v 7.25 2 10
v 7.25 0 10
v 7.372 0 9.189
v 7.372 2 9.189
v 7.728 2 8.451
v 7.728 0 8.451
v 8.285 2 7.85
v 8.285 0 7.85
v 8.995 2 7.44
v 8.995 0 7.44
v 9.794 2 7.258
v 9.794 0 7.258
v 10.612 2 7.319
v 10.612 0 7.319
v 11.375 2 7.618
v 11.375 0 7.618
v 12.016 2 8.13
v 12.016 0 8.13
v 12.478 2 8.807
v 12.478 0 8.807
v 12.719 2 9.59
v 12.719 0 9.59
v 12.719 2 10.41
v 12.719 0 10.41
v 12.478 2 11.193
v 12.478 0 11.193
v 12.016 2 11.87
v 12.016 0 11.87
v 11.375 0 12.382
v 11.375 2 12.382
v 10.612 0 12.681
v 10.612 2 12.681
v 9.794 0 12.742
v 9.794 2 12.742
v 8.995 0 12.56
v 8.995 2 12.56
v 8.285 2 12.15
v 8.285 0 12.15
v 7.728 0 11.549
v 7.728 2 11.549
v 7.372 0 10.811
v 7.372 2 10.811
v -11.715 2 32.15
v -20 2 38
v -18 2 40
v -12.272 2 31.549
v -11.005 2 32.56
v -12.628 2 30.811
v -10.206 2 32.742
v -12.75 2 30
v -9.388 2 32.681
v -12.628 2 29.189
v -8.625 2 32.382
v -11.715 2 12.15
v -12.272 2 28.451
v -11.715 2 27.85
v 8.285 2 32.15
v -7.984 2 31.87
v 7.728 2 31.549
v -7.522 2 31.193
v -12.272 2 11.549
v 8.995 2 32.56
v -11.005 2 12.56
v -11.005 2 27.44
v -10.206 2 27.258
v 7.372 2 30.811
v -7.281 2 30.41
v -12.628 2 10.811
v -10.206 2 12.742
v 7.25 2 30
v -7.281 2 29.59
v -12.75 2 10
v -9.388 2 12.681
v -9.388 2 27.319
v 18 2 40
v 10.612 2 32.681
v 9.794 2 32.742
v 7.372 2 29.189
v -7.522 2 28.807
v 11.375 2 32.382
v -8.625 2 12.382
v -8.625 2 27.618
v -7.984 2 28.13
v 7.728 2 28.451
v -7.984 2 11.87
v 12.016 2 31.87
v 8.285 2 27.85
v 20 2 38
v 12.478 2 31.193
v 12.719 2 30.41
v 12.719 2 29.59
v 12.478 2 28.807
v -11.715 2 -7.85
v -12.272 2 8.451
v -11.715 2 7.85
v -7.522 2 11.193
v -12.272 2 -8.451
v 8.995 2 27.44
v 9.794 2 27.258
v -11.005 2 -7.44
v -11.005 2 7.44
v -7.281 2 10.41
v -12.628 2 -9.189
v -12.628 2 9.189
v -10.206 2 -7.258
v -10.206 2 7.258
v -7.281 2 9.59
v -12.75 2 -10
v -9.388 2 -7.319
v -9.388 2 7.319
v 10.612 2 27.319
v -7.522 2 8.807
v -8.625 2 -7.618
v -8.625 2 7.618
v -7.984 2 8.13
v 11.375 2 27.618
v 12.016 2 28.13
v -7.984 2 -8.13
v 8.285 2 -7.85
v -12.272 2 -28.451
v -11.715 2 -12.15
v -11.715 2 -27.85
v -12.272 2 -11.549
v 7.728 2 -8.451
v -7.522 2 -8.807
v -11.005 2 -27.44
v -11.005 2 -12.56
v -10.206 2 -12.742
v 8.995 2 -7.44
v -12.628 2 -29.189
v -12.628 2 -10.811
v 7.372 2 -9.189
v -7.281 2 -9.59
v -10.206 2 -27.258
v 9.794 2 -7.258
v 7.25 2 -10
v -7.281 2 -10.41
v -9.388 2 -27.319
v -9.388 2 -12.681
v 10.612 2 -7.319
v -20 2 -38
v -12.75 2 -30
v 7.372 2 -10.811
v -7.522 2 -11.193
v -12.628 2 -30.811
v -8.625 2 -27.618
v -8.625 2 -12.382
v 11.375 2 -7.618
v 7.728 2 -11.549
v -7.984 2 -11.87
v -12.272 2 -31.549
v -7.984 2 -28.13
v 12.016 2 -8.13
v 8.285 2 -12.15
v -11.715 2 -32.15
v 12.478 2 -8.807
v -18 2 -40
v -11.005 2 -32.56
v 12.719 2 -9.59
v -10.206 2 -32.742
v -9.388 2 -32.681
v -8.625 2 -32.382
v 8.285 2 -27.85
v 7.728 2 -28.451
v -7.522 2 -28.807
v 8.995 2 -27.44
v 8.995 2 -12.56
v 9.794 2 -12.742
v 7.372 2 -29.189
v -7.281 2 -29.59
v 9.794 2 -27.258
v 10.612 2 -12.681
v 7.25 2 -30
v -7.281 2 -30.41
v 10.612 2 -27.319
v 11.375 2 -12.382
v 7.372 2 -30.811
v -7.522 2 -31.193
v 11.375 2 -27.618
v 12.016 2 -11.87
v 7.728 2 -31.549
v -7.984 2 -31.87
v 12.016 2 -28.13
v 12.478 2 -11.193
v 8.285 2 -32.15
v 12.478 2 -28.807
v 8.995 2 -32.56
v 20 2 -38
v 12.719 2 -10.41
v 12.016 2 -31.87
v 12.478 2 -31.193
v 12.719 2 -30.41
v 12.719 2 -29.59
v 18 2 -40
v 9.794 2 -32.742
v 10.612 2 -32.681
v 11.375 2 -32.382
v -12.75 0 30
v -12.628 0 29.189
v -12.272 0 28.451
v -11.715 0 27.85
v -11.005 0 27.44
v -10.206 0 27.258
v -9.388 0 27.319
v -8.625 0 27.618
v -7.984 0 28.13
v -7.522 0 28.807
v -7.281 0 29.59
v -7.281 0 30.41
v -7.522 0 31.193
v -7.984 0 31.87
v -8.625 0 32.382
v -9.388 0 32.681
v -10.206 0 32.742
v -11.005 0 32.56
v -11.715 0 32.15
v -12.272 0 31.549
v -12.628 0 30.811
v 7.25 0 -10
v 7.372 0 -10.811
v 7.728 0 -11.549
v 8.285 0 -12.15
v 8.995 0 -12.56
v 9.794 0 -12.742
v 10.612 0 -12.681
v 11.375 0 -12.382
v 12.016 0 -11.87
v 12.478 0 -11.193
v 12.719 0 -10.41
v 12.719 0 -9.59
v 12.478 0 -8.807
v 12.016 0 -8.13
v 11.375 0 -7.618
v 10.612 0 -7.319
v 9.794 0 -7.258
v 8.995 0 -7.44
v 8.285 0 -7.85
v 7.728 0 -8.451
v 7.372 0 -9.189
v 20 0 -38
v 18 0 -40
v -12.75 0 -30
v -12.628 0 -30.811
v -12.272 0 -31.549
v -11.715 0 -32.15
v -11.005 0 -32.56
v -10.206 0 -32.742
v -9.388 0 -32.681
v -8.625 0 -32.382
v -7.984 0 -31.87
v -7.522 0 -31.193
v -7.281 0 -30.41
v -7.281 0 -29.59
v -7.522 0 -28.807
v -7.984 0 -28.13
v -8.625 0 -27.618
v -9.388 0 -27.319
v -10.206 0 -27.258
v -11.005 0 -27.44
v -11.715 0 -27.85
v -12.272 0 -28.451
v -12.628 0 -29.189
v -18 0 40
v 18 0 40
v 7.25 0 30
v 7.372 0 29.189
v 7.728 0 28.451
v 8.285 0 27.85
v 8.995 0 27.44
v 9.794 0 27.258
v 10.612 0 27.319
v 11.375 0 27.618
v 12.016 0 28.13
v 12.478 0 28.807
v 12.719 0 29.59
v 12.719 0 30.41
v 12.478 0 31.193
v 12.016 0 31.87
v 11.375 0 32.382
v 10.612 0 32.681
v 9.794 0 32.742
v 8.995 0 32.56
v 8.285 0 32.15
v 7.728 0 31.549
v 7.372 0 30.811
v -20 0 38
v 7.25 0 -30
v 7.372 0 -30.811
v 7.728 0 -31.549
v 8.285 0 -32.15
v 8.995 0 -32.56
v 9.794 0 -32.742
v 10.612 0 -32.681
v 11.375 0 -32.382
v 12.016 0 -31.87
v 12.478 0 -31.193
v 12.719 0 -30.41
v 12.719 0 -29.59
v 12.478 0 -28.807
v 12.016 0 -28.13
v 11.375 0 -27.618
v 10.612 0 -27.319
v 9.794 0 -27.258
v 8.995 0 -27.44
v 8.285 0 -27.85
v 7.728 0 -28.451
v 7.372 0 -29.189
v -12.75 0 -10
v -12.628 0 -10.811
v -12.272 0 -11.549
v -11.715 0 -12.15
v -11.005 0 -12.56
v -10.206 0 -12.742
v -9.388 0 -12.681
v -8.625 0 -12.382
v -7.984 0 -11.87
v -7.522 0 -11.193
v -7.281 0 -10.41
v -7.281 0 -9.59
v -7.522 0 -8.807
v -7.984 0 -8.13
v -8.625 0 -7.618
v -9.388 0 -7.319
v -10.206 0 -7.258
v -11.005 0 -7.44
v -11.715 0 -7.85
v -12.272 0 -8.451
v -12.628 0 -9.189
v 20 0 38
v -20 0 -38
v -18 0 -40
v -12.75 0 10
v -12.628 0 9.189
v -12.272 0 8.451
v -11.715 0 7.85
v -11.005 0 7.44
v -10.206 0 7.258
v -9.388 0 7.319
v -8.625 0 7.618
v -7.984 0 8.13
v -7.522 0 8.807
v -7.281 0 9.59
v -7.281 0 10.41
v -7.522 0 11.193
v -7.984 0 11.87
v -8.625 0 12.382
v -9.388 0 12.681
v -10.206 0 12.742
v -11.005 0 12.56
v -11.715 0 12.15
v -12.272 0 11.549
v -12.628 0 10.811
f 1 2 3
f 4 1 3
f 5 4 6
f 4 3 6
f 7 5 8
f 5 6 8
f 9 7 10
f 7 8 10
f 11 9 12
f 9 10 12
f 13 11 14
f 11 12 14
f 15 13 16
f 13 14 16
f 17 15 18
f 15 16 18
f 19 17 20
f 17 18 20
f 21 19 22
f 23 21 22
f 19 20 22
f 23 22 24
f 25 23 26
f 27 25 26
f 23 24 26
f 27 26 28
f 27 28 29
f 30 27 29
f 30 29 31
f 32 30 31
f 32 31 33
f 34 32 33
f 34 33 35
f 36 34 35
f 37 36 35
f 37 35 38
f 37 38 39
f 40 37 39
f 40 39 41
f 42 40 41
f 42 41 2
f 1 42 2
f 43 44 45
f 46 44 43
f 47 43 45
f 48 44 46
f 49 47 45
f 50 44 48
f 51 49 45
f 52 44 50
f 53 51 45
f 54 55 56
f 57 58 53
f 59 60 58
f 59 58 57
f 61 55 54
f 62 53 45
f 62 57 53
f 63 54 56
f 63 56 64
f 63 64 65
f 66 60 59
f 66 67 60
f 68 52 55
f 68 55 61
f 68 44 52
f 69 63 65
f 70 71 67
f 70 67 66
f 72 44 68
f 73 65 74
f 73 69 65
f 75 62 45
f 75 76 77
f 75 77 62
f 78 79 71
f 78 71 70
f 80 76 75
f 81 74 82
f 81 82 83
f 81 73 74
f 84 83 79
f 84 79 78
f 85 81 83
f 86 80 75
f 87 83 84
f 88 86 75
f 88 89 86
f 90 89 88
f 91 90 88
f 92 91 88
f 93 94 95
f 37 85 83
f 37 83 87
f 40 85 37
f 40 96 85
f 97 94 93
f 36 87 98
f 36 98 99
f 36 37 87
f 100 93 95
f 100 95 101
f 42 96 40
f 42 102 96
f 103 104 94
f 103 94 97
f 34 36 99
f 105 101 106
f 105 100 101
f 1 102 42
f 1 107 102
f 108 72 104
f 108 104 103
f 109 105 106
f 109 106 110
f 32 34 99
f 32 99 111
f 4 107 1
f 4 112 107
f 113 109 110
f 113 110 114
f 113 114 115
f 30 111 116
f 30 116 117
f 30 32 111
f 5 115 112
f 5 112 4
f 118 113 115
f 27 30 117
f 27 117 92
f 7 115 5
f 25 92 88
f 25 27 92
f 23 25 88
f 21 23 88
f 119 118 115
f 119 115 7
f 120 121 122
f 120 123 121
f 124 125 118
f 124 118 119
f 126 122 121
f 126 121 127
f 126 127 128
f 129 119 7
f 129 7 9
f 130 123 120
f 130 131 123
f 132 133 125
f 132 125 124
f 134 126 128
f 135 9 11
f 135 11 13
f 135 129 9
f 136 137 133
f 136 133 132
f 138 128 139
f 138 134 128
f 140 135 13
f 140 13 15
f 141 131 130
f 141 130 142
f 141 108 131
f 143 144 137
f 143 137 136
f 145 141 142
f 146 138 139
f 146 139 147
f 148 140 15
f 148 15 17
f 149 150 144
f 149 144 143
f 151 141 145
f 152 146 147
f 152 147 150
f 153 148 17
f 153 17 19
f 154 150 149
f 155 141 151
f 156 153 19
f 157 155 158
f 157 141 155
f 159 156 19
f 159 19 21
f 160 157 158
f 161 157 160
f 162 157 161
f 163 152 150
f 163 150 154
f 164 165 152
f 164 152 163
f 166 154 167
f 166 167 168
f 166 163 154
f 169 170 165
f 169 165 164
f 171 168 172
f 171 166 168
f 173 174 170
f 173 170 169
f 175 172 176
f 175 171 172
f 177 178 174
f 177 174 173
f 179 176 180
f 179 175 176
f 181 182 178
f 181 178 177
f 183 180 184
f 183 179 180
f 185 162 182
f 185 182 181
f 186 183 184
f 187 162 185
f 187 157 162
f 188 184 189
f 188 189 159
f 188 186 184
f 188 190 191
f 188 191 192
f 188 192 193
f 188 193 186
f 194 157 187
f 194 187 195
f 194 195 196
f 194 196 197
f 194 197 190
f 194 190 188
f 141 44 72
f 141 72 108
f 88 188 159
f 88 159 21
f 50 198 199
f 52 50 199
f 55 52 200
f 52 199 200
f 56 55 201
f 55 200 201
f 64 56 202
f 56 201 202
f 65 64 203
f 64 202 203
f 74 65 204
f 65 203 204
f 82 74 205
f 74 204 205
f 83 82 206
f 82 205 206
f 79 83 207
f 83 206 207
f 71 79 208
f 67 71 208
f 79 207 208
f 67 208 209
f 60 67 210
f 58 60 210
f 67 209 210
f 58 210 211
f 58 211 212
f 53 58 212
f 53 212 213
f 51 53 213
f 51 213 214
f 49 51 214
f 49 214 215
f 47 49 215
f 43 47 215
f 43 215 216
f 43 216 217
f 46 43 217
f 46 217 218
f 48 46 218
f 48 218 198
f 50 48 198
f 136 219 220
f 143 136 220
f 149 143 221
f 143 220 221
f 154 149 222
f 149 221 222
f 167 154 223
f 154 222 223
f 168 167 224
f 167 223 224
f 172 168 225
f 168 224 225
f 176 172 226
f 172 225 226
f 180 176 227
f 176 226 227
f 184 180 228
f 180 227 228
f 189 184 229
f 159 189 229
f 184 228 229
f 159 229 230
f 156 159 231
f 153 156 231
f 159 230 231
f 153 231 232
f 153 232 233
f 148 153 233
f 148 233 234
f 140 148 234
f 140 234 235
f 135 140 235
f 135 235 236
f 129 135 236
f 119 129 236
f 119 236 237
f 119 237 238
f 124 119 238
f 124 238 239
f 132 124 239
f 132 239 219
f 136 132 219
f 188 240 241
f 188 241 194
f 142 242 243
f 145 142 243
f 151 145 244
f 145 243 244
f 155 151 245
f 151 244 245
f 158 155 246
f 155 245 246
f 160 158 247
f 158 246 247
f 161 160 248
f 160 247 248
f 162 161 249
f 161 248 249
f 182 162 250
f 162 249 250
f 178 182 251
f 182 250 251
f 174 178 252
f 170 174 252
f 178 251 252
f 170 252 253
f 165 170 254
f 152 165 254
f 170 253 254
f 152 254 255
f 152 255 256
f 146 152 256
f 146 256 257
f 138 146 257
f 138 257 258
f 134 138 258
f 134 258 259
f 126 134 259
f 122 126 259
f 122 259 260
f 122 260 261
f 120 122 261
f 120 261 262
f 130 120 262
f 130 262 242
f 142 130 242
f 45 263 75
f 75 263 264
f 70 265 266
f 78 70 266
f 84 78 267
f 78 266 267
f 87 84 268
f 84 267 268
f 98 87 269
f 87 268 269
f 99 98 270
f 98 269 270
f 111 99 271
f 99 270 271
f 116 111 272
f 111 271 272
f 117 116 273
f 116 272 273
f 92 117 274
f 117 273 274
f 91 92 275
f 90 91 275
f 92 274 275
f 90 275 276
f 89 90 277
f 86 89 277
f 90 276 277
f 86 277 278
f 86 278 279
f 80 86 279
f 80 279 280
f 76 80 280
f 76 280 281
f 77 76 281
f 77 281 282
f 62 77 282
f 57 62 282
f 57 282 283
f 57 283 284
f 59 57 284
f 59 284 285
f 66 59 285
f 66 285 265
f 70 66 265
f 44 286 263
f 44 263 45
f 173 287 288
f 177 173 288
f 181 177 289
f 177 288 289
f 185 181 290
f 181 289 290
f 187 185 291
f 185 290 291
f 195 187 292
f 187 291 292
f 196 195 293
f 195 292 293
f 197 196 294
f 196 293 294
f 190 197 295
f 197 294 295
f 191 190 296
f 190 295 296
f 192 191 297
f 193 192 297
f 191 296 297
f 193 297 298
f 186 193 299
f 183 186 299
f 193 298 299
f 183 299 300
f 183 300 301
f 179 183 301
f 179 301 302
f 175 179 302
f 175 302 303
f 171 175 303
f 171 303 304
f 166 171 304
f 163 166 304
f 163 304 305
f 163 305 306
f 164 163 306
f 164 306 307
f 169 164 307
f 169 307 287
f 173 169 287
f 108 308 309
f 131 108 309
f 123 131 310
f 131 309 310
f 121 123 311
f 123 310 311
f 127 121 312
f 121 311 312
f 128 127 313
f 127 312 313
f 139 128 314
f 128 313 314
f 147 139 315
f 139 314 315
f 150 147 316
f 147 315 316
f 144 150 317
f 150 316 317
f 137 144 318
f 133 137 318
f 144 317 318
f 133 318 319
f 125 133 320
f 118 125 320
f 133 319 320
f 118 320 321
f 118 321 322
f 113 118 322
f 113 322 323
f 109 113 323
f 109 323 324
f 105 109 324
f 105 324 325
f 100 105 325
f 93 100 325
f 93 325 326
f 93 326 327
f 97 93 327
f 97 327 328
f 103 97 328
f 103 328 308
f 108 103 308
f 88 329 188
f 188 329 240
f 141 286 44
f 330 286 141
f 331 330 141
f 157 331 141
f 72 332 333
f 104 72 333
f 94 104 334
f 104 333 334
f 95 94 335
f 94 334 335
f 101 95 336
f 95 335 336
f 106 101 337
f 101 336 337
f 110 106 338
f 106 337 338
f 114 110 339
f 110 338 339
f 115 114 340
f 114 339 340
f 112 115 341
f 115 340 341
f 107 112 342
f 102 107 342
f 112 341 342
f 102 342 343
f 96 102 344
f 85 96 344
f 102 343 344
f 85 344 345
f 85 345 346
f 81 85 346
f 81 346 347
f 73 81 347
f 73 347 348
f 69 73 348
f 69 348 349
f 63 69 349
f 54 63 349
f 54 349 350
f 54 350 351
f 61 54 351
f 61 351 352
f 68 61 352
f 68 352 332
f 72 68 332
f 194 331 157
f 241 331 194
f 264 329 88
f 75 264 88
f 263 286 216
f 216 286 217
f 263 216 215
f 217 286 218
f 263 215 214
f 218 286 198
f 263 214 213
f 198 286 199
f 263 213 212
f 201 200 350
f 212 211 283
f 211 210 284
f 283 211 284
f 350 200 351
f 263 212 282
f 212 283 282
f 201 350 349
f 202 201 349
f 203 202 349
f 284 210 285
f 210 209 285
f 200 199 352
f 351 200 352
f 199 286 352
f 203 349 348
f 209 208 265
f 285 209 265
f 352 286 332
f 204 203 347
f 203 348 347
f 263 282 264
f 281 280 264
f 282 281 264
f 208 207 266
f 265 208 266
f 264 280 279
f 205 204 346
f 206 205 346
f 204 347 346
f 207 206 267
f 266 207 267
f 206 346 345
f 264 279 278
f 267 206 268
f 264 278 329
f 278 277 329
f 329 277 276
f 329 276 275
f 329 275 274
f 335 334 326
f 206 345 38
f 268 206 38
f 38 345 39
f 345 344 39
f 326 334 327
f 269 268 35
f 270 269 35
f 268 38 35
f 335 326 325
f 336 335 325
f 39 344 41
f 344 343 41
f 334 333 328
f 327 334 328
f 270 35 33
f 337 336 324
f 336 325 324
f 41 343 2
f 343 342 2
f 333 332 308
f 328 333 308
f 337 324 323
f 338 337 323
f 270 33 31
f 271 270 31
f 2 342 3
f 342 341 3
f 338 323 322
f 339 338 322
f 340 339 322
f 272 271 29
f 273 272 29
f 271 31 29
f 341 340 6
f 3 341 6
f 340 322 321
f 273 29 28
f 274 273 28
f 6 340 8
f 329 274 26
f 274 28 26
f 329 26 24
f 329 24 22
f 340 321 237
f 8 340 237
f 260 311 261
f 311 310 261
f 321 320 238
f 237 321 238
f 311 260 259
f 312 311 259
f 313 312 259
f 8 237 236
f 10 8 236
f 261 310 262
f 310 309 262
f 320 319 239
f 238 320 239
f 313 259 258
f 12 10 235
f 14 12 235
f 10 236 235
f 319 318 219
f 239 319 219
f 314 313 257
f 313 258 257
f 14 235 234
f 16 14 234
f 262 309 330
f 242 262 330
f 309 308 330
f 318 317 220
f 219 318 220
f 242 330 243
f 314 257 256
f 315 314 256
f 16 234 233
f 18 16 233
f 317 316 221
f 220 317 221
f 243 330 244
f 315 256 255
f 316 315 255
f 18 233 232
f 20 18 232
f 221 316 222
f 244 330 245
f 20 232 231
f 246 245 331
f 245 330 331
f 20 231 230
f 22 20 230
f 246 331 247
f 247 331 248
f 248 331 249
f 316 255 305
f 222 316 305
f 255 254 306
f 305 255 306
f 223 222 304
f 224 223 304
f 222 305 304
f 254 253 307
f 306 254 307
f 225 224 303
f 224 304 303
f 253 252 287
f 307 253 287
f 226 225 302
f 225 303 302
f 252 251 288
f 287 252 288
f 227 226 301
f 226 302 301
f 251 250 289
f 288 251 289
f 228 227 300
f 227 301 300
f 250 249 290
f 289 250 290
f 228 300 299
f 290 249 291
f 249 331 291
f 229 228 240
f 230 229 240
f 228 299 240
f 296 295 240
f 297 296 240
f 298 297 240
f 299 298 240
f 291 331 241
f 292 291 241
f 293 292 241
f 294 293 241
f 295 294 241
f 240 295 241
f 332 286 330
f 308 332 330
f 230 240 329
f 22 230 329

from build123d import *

# Parameters (mm, degrees)
SKETCH_1_W        = 40
SKETCH_1_H        = 80
EXTRUDE_1_DEPTH   = 2
CHAMFER_1_SIZE    = 2
HOLE_WIZARD_M51_D = 5.5


with BuildPart() as part:
    # Эскиз1 → Бобышка-Вытянуть1 (new body)
    with BuildSketch(Plane(origin=(0, 0, 0), x_dir=(1, 0, 0), z_dir=(0, 1, 0))):
        Rectangle(SKETCH_1_W, SKETCH_1_H)
    extrude(amount=EXTRUDE_1_DEPTH)

    # Фаска1
    chamfer_1_edges = [part.edges().sort_by_distance(p)[0] for p in [
        (20, 1, 40),
        (-20, 1, 40),
        (-20, 1, -40),
        (20, 1, -40),
    ]]
    chamfer(chamfer_1_edges, length=CHAMFER_1_SIZE)

    # Отверстие с зазором M51 (through all)
    with Locations(Plane(origin=(0, 2, 0), x_dir=(1, 0, 0), z_dir=(0, 1, 0))):
        with Locations((-10, 10), (10, 10), (-10, -10), (10, -10), (-10, 30), (10, 30), (10, -30), (-10, -30)):
            Hole(HOLE_WIZARD_M51_D / 2)


solid = part.part
